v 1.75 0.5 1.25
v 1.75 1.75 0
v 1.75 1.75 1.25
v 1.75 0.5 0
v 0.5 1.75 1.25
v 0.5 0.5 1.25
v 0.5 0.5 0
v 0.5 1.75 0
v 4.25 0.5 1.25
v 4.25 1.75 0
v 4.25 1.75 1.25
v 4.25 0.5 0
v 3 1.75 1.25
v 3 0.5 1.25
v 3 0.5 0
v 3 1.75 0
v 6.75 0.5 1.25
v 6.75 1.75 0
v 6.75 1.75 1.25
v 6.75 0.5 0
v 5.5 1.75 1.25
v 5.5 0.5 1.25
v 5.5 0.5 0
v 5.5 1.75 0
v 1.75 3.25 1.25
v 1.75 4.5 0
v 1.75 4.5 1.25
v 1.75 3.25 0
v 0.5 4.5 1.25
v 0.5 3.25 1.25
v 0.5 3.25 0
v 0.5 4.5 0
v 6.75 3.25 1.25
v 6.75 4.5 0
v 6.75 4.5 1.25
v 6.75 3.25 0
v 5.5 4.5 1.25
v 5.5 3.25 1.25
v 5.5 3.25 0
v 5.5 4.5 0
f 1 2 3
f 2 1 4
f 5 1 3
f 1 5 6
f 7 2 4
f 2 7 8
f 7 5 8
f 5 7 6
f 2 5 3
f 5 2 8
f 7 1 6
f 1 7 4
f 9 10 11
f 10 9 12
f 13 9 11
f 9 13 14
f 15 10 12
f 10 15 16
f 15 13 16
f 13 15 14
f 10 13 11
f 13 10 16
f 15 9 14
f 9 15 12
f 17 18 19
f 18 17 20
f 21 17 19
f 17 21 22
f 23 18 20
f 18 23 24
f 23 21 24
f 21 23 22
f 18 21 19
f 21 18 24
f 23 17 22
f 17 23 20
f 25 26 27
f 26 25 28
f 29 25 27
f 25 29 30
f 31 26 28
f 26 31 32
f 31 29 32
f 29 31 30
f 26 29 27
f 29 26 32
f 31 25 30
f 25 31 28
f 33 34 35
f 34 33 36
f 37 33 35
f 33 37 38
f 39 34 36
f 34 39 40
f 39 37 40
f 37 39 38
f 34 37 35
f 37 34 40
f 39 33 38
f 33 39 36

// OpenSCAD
union() {
  translate([0.5, 0.5, 0.0]) cube(size=[1.25,1.25,1.25], center=false);
  translate([3.0, 0.5, 0.0]) cube(size=[1.25,1.25,1.25], center=false);
  translate([5.5, 0.5, 0.0]) cube(size=[1.25,1.25,1.25], center=false);
  translate([0.5, 3.25, 0.0]) cube(size=[1.25,1.25,1.25], center=false);
  translate([5.5, 3.25, 0.0]) cube(size=[1.25,1.25,1.25], center=false);
}
